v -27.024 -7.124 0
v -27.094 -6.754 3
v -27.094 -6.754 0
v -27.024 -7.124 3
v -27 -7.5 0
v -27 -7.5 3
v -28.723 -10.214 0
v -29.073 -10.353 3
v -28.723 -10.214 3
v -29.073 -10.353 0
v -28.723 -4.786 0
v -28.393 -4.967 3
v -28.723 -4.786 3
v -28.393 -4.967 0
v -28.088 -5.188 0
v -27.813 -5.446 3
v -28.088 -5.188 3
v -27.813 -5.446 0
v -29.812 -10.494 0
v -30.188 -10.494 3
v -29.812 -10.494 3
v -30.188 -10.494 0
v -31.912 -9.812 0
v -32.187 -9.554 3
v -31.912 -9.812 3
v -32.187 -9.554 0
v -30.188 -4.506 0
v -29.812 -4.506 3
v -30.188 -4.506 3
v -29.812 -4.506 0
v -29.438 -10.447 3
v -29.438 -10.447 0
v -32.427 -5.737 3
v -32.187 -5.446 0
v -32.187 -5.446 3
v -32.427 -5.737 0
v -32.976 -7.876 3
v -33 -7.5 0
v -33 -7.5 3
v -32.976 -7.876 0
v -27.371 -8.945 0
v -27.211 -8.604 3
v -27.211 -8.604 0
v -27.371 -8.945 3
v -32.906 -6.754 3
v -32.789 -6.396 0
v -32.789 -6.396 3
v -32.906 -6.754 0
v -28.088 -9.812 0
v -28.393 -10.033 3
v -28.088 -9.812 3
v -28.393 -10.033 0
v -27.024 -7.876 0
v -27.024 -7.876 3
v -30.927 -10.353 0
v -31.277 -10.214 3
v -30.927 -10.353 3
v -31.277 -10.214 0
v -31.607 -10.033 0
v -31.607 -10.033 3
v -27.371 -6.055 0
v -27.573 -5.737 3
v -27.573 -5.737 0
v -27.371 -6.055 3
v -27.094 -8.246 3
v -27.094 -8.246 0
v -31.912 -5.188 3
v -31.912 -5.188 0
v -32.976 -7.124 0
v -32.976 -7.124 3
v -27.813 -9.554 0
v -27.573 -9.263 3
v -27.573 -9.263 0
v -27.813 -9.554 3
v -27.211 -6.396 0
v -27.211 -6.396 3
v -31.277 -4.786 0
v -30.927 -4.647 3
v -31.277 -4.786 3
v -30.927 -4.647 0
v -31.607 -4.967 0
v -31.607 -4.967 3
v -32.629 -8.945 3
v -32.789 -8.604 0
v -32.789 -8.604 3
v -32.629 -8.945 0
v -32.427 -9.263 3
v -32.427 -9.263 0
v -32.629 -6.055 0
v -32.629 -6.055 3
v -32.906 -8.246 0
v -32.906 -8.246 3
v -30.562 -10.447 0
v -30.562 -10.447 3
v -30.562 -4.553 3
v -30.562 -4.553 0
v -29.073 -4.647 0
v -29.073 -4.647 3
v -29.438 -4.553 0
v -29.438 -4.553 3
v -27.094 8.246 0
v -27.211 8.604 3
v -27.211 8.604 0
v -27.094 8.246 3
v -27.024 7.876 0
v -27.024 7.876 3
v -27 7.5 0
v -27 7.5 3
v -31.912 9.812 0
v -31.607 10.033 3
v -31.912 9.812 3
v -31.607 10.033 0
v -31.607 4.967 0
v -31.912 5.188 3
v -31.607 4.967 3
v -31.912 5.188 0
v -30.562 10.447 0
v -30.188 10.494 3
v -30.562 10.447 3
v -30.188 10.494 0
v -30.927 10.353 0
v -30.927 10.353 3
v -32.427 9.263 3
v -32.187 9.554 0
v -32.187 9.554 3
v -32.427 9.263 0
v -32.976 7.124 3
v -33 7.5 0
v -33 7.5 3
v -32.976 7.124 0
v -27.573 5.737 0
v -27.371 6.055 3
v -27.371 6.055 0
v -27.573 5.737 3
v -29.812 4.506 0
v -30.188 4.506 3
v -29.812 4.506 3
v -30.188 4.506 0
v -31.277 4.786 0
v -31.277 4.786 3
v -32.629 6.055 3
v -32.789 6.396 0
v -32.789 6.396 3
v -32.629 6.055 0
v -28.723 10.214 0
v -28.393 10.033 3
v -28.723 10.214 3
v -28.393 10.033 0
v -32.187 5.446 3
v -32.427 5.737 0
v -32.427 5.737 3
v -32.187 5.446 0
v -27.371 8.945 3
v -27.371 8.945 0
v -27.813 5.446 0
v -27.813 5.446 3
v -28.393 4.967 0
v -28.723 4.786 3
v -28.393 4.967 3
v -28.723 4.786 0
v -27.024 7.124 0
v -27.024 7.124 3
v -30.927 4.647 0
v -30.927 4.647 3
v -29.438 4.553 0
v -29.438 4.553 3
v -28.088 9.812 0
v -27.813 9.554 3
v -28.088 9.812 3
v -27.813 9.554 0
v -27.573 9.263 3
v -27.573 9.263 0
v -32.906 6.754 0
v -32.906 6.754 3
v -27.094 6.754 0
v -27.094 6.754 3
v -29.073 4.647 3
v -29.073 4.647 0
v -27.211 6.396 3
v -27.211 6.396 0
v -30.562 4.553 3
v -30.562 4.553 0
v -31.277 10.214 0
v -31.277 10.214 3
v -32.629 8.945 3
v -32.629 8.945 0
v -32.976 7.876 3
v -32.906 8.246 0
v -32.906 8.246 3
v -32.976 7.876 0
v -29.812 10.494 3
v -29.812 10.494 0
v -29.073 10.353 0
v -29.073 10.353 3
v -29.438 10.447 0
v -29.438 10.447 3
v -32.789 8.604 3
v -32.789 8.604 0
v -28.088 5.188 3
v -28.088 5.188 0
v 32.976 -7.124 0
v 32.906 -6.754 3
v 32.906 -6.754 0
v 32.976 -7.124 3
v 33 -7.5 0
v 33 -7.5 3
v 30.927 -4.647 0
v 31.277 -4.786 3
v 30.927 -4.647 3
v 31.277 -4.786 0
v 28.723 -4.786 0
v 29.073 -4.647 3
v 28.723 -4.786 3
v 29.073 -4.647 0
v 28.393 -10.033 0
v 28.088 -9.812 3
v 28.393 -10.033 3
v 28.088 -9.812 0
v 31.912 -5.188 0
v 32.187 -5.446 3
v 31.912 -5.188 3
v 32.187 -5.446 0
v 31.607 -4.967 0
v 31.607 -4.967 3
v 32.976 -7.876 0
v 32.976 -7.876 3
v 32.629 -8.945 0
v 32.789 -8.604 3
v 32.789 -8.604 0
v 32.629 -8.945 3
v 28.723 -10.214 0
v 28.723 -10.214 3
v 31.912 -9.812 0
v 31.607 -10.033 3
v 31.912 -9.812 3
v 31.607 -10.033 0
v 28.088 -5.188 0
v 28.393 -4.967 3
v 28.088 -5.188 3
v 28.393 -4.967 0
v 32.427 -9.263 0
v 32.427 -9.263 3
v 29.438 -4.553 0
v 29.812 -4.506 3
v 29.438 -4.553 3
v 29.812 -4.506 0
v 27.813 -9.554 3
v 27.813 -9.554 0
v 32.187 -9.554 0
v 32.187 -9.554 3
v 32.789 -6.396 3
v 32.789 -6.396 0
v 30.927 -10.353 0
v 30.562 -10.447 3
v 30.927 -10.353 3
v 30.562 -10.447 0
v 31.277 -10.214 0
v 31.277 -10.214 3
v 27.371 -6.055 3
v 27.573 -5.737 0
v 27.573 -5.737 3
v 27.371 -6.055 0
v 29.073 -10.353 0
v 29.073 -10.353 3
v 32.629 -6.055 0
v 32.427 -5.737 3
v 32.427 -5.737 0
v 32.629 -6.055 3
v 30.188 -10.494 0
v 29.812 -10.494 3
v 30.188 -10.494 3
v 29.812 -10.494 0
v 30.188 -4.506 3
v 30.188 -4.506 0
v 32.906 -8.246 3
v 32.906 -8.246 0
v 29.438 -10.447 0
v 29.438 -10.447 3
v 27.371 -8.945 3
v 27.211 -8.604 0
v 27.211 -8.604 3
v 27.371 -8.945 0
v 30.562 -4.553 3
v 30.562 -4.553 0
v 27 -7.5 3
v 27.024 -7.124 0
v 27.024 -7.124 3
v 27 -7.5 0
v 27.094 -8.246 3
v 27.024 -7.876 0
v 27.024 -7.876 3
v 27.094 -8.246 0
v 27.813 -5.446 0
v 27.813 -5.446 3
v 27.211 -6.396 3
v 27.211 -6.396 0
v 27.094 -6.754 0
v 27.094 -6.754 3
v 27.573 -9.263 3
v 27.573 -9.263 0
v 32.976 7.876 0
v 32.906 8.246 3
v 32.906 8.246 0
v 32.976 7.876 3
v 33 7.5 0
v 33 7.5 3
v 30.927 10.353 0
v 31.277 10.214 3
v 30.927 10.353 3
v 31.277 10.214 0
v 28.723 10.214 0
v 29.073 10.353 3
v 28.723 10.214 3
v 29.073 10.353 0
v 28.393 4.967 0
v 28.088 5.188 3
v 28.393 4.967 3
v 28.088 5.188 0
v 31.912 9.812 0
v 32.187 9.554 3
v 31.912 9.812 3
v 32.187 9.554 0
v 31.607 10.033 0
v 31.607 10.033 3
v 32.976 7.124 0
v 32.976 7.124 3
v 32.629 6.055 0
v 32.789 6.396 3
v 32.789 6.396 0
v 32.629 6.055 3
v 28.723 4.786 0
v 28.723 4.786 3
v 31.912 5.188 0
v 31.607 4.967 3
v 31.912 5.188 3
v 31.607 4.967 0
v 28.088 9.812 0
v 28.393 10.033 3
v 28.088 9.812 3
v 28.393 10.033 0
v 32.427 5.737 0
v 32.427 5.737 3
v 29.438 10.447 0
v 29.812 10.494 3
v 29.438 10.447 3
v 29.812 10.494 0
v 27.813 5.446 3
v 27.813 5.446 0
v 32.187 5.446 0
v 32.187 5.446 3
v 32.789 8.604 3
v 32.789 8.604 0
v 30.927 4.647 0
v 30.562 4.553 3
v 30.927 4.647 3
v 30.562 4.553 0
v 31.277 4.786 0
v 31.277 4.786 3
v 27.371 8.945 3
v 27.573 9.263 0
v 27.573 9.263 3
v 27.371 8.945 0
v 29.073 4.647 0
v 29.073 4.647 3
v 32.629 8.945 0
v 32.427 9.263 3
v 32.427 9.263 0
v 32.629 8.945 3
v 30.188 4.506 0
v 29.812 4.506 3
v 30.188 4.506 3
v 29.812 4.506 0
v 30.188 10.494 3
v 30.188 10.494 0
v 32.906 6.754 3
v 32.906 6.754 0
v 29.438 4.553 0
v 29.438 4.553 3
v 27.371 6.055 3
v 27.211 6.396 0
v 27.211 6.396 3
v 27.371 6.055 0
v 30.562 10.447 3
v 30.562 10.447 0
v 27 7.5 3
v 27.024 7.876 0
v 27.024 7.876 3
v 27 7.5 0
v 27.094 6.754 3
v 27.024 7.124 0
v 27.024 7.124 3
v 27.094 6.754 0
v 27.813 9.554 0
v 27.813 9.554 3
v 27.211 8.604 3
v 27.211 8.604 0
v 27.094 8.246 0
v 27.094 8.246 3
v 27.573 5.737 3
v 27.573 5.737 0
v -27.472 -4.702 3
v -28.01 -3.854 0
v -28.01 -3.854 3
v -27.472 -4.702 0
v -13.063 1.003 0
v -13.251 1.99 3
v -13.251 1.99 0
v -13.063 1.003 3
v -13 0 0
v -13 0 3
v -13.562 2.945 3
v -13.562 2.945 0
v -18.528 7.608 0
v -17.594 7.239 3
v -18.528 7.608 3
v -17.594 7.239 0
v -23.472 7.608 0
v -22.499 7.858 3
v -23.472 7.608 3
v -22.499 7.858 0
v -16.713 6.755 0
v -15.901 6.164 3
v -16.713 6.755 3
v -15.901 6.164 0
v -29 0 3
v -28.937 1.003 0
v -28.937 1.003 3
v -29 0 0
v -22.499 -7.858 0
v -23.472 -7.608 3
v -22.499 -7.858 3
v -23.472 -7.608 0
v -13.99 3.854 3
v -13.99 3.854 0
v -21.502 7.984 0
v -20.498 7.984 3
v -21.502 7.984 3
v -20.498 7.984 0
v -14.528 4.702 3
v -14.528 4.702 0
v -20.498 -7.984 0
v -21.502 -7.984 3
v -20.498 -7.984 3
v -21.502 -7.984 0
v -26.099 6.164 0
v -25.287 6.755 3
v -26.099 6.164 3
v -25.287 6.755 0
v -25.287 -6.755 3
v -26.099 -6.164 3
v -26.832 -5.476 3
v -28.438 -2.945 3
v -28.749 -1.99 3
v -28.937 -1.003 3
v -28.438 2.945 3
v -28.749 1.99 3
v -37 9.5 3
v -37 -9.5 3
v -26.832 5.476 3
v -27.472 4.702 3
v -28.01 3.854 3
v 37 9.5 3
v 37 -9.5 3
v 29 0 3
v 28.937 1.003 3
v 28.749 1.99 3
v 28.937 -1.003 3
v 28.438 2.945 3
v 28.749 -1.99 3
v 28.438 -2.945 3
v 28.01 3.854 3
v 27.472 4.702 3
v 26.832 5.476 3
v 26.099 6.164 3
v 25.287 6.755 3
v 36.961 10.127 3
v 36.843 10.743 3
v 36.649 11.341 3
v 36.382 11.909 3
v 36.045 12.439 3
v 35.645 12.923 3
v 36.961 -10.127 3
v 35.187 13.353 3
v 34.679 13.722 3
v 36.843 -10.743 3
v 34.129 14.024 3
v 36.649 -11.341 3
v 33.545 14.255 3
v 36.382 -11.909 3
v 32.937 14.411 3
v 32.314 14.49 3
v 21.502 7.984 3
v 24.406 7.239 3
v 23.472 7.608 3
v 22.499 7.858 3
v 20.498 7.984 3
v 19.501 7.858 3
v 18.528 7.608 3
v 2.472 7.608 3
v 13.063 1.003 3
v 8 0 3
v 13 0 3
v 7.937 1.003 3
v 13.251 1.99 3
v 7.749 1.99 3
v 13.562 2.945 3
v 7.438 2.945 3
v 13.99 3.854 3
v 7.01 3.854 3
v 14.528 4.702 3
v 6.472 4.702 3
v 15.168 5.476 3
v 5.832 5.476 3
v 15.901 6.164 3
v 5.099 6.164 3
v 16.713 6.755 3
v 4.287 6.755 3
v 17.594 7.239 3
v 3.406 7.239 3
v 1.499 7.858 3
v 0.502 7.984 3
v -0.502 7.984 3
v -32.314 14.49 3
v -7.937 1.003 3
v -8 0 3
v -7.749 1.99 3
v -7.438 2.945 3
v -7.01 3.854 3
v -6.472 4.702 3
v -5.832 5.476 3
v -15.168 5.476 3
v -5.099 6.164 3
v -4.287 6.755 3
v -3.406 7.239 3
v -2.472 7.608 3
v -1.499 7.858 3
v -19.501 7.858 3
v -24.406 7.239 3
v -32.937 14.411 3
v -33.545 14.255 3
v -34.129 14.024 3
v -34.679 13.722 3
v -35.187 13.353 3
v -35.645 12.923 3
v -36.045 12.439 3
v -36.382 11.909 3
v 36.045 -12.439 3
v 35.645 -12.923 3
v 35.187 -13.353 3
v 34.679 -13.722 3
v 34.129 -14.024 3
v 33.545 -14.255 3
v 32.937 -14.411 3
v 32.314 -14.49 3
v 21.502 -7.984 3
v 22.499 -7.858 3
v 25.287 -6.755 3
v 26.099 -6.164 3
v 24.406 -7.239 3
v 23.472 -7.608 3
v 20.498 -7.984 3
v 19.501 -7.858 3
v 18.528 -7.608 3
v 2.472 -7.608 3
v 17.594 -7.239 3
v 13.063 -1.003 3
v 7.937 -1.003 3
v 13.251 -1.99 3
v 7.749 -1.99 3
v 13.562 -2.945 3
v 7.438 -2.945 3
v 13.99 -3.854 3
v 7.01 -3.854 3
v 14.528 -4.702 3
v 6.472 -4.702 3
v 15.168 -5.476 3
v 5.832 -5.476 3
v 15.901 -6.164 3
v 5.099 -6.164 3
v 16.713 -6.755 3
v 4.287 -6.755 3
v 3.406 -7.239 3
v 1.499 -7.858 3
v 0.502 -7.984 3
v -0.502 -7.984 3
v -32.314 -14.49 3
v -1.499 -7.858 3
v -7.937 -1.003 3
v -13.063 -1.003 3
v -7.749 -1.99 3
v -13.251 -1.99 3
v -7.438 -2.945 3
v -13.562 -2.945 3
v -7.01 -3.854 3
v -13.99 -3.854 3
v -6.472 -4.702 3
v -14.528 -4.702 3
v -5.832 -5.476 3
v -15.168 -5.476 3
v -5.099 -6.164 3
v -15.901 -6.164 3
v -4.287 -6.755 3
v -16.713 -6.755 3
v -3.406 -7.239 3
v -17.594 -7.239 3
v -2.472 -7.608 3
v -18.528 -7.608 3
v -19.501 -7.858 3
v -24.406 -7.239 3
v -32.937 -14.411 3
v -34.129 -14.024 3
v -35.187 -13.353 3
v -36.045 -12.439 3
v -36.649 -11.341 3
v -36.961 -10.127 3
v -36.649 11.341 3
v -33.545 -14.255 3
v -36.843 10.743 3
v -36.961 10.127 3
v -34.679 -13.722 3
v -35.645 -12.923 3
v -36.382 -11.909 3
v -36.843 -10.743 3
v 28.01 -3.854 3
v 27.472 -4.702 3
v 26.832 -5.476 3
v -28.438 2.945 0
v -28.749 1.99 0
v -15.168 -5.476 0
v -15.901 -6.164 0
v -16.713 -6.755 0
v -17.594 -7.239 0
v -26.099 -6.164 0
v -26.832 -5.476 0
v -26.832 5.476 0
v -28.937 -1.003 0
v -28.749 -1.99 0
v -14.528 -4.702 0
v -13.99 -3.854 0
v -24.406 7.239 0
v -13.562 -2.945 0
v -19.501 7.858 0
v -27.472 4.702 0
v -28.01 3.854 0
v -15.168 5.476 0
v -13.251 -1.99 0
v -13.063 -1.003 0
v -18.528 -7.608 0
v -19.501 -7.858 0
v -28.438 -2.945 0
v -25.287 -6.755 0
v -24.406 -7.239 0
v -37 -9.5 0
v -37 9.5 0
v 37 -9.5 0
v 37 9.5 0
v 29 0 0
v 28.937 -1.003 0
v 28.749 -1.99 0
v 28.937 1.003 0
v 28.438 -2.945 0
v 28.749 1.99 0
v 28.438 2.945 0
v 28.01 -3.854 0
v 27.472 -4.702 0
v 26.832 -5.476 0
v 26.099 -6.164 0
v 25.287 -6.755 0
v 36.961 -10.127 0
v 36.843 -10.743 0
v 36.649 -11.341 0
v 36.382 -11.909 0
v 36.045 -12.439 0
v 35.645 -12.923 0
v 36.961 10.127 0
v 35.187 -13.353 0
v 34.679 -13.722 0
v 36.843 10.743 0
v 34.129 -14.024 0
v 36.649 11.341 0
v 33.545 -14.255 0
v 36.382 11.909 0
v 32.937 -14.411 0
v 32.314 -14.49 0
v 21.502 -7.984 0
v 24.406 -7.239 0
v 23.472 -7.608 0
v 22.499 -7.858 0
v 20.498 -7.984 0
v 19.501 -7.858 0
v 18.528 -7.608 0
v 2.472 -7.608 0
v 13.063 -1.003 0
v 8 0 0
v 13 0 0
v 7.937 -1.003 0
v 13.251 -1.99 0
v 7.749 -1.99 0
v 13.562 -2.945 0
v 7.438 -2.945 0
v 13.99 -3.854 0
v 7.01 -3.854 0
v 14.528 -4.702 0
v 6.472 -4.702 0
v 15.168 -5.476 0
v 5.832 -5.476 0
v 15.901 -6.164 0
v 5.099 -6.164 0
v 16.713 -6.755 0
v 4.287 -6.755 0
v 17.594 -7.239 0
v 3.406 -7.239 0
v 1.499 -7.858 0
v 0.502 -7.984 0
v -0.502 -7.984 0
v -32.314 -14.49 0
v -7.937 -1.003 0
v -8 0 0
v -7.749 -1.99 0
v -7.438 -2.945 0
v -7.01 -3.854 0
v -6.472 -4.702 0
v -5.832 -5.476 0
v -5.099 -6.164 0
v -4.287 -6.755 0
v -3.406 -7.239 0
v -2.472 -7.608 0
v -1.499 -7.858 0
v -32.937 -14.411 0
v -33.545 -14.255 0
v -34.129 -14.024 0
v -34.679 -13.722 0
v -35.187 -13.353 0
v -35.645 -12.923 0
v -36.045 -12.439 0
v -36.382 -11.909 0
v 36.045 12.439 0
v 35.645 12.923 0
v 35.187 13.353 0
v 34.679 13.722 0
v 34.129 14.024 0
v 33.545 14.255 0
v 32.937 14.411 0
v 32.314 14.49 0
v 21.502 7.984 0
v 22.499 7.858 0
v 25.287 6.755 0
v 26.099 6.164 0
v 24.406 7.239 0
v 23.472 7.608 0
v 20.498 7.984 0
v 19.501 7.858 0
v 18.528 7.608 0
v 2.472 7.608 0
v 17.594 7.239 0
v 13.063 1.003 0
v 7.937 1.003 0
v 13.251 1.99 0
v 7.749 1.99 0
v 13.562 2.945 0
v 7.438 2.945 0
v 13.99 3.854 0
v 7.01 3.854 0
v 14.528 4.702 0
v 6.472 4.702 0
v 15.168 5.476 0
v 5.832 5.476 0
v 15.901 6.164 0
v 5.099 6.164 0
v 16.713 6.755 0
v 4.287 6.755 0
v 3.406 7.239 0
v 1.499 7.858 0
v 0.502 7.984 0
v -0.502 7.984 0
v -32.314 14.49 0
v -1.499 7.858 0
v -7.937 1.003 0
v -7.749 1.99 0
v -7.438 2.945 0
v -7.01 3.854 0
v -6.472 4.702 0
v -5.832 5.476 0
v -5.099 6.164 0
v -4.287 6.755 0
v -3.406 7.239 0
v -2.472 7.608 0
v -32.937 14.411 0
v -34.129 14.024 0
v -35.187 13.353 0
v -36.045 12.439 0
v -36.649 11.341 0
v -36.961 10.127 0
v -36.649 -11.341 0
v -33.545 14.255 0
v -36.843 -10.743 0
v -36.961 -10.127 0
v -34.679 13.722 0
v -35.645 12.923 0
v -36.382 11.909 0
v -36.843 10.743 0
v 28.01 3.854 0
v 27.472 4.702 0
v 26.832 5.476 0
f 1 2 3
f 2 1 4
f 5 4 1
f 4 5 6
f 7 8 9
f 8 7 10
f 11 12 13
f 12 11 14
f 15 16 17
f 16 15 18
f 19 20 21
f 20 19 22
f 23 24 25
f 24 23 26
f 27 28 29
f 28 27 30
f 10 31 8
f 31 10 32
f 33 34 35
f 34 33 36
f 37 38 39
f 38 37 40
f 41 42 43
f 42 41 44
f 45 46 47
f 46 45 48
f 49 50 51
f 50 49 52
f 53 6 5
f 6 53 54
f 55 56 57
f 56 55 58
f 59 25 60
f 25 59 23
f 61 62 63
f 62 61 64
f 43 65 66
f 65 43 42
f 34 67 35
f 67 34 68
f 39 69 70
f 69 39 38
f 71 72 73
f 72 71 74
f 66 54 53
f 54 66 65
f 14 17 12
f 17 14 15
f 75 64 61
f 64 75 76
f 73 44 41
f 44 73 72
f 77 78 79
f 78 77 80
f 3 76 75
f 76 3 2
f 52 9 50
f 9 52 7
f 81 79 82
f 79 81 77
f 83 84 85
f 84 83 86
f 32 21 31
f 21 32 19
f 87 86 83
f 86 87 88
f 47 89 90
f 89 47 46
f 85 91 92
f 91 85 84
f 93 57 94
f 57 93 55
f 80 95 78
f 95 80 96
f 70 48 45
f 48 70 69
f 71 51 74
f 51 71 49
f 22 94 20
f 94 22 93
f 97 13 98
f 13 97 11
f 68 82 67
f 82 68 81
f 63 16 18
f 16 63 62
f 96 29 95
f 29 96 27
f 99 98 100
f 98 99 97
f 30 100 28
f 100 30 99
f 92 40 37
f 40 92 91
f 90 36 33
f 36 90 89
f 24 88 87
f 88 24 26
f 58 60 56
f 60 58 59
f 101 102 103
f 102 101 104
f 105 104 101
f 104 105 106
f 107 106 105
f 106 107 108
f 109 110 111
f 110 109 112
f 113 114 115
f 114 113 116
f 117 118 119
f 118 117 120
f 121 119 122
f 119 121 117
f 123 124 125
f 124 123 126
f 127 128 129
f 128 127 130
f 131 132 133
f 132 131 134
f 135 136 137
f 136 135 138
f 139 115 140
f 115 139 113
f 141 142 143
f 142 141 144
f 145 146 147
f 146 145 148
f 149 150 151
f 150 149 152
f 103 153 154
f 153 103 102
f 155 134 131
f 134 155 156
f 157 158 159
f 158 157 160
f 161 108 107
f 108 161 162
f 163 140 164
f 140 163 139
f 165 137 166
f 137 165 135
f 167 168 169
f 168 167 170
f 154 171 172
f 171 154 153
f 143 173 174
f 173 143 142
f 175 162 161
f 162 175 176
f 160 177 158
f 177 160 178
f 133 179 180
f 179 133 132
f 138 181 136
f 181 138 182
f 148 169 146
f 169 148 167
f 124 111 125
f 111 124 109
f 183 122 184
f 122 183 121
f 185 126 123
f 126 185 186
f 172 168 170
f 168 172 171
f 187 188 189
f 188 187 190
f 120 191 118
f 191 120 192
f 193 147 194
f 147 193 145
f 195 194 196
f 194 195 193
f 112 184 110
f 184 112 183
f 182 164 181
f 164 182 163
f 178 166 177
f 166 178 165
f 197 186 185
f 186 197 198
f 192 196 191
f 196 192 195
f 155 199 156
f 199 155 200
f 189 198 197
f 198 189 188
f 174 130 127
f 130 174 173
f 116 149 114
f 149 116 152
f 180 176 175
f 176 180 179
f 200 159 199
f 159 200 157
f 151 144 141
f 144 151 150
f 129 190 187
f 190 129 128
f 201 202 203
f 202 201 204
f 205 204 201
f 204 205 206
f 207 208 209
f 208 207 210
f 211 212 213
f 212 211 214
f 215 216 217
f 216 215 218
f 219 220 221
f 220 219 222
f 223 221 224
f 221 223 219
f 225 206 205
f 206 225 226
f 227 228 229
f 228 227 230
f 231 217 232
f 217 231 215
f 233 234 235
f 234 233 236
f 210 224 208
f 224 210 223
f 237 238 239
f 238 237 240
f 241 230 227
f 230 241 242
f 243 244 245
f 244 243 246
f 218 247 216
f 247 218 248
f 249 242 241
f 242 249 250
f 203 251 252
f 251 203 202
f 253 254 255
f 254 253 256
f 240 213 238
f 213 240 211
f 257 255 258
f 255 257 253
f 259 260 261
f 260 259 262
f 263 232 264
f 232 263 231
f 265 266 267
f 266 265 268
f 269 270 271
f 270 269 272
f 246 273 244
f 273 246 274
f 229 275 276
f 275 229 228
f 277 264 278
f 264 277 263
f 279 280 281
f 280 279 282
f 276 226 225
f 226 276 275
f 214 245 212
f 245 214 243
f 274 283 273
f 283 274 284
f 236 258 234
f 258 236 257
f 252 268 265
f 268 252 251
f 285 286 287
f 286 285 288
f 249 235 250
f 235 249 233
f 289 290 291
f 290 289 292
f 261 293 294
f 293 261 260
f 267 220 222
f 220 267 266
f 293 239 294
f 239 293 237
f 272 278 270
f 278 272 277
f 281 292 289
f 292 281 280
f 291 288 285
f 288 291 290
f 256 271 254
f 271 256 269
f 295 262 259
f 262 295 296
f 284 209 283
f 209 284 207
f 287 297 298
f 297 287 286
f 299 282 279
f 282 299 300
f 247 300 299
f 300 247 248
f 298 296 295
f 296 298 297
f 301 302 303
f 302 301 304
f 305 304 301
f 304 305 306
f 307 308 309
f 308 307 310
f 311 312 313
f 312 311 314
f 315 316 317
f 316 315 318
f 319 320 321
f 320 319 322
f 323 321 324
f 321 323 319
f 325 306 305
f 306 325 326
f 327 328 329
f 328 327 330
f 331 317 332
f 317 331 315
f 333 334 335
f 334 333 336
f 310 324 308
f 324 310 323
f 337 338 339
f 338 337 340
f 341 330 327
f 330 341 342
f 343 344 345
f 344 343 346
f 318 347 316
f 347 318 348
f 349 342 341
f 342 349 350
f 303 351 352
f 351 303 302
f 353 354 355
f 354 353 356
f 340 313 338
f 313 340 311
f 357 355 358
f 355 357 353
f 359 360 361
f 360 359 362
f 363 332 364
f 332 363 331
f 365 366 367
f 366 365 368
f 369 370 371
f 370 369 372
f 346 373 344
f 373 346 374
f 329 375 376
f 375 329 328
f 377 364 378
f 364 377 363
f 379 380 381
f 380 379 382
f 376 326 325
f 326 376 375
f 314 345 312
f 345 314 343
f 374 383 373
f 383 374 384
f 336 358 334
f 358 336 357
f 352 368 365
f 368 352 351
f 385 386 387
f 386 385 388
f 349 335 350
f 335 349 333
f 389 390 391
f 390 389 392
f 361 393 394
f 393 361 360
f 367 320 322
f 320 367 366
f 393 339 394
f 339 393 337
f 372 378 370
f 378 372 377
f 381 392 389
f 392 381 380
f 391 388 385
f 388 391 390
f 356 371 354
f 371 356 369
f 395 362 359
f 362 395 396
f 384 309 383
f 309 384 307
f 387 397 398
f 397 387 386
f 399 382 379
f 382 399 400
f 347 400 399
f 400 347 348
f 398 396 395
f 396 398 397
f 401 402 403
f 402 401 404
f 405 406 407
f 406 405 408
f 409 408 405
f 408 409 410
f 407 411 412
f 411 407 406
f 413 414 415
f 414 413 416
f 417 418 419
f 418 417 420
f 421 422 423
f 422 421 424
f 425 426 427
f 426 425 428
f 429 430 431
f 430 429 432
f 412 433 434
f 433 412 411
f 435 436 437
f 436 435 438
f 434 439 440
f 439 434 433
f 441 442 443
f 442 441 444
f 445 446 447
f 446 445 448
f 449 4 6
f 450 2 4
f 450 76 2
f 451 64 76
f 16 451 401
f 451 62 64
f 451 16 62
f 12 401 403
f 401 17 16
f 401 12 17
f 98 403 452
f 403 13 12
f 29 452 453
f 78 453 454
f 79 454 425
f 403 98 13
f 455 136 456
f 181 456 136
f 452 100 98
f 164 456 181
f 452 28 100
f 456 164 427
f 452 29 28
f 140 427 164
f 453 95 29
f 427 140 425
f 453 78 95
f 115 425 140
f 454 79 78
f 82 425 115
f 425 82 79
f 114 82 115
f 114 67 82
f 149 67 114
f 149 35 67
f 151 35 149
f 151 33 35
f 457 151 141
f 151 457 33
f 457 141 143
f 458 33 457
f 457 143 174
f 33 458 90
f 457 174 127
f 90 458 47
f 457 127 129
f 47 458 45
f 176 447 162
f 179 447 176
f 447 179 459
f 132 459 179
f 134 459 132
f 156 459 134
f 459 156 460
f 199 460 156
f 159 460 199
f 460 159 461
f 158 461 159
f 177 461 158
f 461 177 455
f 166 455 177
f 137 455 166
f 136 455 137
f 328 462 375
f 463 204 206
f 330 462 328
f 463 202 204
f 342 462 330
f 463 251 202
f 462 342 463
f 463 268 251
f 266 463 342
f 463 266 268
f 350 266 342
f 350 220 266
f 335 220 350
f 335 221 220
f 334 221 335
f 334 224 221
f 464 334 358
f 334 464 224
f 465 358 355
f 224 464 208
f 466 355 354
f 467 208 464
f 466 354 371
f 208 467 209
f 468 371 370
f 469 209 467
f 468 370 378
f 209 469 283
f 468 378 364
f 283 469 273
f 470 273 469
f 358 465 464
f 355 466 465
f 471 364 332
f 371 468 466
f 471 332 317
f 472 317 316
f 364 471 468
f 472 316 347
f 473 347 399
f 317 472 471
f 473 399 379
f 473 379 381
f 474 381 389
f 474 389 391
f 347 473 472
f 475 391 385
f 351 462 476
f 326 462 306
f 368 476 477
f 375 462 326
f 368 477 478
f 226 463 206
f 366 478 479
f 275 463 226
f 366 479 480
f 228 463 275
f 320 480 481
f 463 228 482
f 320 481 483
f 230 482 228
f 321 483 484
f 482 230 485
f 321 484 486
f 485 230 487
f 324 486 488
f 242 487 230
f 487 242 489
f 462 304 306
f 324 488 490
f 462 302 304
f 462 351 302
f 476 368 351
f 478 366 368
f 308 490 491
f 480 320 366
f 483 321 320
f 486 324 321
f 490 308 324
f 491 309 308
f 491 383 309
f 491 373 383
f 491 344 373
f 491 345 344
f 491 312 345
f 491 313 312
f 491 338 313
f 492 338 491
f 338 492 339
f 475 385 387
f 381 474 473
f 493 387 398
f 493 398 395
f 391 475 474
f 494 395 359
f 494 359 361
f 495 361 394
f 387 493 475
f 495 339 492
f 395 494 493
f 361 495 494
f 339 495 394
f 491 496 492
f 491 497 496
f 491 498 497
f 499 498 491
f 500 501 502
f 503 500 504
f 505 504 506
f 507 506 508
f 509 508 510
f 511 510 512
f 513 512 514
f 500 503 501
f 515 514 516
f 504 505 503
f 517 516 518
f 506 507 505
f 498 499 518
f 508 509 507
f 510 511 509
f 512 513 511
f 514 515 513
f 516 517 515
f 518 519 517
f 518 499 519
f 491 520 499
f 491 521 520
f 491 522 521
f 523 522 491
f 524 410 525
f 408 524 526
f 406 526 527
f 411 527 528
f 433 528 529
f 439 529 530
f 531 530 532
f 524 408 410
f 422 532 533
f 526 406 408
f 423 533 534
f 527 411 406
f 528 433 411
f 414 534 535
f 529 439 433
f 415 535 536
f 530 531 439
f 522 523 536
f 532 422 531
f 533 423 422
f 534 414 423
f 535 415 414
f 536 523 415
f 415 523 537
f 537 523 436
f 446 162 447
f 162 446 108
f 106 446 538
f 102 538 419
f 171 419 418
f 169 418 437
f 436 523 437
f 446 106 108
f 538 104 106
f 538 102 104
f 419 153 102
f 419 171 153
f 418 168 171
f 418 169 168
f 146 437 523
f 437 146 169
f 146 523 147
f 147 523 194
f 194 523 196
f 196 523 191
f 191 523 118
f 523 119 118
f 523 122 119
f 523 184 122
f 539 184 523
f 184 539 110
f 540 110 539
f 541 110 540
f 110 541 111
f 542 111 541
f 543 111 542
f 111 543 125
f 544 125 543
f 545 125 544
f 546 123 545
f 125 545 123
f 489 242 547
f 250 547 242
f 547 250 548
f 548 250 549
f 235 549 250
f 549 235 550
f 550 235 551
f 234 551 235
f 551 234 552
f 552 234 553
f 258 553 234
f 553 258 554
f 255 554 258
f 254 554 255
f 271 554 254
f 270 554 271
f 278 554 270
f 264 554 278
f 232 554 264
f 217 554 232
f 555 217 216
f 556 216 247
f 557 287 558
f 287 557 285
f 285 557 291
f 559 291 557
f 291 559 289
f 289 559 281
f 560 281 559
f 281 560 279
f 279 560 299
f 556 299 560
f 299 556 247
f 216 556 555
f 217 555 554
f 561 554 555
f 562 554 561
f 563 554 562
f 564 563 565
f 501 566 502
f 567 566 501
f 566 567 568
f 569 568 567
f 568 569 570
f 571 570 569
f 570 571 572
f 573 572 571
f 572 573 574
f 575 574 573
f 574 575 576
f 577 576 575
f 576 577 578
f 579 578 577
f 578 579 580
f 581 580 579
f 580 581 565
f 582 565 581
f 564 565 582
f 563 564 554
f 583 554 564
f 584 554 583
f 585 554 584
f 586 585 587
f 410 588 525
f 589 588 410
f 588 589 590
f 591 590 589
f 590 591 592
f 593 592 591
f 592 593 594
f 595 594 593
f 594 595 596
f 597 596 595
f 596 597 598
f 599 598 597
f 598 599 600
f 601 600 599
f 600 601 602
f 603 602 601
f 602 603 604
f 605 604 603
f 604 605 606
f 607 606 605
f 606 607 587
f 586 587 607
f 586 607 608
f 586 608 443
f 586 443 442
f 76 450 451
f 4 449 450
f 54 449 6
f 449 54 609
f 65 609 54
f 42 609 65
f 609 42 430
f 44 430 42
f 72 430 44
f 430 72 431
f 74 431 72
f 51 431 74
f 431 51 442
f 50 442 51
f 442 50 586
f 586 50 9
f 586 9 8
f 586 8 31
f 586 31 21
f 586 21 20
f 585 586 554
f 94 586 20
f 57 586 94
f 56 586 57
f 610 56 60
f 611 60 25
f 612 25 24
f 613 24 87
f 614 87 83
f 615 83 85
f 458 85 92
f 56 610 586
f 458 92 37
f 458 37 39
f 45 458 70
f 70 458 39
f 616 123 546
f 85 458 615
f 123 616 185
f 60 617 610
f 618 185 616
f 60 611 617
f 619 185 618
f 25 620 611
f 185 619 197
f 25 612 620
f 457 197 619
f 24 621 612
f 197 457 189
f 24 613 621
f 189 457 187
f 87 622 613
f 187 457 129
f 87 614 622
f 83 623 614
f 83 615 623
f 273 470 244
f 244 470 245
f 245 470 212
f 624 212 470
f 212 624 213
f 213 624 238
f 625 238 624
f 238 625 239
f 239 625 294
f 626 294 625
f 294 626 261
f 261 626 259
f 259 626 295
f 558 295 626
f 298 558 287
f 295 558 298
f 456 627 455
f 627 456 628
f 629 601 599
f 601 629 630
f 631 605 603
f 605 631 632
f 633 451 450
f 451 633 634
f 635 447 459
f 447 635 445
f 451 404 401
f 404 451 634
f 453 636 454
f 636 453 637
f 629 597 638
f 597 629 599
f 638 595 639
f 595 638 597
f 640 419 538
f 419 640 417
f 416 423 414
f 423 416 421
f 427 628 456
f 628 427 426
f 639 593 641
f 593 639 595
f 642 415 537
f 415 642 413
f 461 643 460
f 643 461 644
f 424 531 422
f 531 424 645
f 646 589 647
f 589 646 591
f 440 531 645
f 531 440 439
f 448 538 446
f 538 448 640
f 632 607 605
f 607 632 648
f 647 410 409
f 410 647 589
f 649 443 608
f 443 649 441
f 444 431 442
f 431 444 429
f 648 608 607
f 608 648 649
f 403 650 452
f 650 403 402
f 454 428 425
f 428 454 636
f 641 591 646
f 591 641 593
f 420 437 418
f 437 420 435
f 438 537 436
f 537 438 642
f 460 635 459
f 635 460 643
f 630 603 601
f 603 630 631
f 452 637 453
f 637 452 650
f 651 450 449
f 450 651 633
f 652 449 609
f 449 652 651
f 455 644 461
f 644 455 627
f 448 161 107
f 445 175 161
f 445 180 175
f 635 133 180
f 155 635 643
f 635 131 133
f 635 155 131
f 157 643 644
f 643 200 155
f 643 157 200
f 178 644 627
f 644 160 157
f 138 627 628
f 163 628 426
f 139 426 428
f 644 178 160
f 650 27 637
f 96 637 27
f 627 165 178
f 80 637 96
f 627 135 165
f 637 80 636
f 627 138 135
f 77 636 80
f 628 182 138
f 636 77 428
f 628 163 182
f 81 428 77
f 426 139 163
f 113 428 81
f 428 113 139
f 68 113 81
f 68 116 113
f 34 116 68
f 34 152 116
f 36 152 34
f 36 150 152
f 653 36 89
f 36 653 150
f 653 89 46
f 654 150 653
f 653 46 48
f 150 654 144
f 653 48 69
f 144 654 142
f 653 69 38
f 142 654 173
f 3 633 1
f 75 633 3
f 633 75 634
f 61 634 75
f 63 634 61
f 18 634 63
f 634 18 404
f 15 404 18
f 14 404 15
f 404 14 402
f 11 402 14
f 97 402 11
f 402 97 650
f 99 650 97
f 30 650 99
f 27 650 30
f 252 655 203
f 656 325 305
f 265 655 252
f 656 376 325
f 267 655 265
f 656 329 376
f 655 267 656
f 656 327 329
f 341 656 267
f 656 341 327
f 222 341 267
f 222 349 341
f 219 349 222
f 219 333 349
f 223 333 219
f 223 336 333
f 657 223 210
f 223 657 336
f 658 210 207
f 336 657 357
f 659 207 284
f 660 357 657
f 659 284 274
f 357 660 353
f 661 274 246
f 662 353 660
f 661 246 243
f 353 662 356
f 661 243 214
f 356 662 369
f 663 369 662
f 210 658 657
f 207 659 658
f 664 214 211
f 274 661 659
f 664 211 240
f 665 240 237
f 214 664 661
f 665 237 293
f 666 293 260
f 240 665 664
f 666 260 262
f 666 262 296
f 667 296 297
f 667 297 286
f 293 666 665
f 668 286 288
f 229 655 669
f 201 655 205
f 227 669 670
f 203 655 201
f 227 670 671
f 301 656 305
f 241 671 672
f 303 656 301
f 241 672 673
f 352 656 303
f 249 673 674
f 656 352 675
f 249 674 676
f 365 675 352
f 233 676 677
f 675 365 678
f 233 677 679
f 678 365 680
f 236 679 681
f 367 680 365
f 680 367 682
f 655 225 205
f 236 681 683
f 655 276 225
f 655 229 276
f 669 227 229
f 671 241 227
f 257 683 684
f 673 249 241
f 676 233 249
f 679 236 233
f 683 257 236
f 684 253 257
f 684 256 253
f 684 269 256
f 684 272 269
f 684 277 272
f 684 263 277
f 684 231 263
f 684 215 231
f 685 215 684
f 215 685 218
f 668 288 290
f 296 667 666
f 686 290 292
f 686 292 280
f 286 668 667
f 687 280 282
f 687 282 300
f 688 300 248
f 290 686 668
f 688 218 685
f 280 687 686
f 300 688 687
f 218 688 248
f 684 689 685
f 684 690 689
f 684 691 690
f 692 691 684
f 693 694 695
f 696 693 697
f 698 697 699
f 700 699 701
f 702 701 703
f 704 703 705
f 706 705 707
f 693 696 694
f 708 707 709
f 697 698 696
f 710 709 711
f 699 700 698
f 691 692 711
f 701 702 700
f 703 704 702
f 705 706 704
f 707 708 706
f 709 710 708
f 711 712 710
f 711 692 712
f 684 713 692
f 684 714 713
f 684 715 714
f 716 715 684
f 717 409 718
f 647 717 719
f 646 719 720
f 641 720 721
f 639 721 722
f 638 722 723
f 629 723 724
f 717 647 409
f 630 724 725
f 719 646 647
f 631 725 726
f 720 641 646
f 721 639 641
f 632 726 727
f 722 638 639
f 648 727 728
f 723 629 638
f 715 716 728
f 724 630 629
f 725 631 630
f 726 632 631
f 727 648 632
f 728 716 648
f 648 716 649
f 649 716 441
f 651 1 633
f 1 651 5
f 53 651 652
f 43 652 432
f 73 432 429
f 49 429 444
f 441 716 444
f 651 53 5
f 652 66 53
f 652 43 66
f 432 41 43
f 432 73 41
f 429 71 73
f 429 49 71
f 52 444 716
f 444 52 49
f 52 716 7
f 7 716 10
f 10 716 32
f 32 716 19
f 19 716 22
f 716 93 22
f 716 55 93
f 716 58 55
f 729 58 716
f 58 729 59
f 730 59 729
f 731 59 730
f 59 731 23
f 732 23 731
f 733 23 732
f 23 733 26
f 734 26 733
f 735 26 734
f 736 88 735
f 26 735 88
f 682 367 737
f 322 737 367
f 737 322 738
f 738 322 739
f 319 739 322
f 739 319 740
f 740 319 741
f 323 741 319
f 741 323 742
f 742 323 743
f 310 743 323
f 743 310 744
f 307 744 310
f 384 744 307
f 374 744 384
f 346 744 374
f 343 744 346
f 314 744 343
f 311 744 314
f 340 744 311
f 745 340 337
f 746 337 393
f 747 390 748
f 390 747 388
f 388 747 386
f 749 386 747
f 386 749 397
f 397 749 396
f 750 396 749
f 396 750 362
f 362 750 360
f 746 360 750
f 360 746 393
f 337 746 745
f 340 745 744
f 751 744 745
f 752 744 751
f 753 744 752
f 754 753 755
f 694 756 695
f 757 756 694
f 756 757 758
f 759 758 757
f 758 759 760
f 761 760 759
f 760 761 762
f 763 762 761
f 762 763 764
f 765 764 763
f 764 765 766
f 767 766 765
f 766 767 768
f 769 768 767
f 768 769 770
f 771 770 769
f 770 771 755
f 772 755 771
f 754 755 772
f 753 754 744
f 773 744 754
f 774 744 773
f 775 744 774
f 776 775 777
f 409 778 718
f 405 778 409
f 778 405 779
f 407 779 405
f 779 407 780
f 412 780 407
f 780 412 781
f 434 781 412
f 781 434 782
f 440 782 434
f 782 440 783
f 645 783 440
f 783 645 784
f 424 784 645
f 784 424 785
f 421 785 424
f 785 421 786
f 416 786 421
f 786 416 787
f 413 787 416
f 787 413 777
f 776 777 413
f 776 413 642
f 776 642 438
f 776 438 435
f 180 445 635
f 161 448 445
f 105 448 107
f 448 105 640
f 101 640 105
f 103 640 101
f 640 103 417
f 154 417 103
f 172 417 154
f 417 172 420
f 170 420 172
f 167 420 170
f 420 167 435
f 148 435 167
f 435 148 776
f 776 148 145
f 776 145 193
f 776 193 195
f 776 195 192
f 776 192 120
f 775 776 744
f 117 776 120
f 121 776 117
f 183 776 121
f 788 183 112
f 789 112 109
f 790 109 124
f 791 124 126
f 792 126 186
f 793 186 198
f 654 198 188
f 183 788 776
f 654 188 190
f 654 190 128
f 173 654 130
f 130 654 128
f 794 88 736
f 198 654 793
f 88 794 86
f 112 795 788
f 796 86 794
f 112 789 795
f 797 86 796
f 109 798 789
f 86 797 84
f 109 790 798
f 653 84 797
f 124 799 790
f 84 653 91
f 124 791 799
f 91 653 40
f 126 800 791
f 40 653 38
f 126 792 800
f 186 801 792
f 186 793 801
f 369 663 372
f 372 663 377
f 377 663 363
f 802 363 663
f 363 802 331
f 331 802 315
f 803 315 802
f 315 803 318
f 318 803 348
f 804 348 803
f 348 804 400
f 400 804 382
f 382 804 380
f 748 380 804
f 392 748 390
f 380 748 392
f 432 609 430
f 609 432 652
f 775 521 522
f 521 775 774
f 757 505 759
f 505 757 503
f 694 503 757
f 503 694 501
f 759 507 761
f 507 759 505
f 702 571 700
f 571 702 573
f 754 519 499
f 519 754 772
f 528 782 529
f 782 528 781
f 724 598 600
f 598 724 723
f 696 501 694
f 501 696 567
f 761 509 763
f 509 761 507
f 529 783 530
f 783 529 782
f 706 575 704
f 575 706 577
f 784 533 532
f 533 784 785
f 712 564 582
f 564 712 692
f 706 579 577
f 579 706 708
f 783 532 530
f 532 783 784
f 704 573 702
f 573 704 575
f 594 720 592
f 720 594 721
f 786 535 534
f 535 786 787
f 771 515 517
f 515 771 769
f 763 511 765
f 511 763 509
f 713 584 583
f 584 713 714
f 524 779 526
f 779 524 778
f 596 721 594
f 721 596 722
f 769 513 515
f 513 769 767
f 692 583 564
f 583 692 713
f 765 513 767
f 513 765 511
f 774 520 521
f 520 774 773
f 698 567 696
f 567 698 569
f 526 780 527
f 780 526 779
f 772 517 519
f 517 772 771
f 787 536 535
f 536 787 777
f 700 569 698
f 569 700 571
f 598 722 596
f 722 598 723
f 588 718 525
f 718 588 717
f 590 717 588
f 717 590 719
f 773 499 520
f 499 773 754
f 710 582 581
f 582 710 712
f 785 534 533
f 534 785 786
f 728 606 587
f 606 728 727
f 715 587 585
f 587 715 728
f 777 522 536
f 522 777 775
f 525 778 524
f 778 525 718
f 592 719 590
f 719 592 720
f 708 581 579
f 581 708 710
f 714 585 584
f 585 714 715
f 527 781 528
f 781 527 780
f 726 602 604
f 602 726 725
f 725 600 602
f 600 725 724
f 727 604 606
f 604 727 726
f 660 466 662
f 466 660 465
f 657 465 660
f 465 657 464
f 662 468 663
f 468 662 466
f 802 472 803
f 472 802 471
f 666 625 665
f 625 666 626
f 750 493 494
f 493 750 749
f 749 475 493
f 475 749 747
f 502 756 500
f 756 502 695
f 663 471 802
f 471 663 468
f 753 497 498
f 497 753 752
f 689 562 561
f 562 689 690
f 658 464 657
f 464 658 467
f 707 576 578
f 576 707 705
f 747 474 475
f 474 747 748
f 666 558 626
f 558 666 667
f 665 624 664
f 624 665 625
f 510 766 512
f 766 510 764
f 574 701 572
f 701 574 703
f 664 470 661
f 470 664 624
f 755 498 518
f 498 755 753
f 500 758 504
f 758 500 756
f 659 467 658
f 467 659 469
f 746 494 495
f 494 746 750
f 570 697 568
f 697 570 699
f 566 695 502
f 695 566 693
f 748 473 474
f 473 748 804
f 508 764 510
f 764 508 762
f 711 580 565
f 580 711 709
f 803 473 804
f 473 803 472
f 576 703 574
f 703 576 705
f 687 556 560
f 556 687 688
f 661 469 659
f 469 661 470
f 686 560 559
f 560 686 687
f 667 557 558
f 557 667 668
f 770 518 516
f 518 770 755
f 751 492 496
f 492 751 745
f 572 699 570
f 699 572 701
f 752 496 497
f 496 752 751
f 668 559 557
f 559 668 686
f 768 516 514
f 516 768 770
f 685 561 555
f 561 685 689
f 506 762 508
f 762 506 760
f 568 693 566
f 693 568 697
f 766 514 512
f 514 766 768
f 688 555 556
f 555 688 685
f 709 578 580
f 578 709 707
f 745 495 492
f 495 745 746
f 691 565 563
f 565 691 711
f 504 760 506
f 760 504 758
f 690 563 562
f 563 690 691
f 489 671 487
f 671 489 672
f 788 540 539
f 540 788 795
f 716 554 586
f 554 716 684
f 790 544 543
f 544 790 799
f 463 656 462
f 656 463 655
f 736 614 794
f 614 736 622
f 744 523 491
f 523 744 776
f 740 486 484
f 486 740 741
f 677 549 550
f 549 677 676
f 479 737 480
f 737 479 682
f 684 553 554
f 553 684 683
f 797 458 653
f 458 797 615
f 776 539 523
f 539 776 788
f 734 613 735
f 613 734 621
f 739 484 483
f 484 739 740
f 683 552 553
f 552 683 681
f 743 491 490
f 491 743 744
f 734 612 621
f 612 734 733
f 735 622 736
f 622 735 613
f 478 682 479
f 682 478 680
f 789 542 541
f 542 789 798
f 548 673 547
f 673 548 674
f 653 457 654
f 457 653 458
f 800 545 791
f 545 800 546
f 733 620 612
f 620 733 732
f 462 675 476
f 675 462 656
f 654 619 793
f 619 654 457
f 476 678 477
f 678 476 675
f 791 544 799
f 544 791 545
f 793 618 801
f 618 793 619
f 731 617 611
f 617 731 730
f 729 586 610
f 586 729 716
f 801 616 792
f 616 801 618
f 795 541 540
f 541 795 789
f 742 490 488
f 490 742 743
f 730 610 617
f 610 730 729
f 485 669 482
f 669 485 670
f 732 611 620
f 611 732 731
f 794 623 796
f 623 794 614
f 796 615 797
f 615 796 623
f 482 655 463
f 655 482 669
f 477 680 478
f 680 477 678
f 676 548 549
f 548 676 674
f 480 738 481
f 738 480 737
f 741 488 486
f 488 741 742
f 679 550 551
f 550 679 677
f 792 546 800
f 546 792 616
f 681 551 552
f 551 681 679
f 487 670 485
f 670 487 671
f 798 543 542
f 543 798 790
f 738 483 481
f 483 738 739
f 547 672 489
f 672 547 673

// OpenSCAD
$fn = 50;


difference() {
	union() {
		hull() {
			translate(v = [-32.0000000000, 9.5000000000, 0]) {
				cylinder(h = 3, r = 5);
			}
			translate(v = [32.0000000000, 9.5000000000, 0]) {
				cylinder(h = 3, r = 5);
			}
			translate(v = [-32.0000000000, -9.5000000000, 0]) {
				cylinder(h = 3, r = 5);
			}
			translate(v = [32.0000000000, -9.5000000000, 0]) {
				cylinder(h = 3, r = 5);
			}
		}
	}
	union() {
		#translate(v = [-30.0000000000, -7.5000000000, -100.0000000000]) {
			cylinder(h = 200, r = 3.0000000000);
		}
		#translate(v = [-30.0000000000, 7.5000000000, -100.0000000000]) {
			cylinder(h = 200, r = 3.0000000000);
		}
		#translate(v = [30.0000000000, -7.5000000000, -100.0000000000]) {
			cylinder(h = 200, r = 3.0000000000);
		}
		#translate(v = [30.0000000000, 7.5000000000, -100.0000000000]) {
			cylinder(h = 200, r = 3.0000000000);
		}
		#translate(v = [-21.0000000000, 0, 0]) {
			cylinder(h = 3, r = 8.0000000000);
		}
		#cylinder(h = 3, r = 8.0000000000);
		#translate(v = [21.0000000000, 0, 0]) {
			cylinder(h = 3, r = 8.0000000000);
		}
	}
}
